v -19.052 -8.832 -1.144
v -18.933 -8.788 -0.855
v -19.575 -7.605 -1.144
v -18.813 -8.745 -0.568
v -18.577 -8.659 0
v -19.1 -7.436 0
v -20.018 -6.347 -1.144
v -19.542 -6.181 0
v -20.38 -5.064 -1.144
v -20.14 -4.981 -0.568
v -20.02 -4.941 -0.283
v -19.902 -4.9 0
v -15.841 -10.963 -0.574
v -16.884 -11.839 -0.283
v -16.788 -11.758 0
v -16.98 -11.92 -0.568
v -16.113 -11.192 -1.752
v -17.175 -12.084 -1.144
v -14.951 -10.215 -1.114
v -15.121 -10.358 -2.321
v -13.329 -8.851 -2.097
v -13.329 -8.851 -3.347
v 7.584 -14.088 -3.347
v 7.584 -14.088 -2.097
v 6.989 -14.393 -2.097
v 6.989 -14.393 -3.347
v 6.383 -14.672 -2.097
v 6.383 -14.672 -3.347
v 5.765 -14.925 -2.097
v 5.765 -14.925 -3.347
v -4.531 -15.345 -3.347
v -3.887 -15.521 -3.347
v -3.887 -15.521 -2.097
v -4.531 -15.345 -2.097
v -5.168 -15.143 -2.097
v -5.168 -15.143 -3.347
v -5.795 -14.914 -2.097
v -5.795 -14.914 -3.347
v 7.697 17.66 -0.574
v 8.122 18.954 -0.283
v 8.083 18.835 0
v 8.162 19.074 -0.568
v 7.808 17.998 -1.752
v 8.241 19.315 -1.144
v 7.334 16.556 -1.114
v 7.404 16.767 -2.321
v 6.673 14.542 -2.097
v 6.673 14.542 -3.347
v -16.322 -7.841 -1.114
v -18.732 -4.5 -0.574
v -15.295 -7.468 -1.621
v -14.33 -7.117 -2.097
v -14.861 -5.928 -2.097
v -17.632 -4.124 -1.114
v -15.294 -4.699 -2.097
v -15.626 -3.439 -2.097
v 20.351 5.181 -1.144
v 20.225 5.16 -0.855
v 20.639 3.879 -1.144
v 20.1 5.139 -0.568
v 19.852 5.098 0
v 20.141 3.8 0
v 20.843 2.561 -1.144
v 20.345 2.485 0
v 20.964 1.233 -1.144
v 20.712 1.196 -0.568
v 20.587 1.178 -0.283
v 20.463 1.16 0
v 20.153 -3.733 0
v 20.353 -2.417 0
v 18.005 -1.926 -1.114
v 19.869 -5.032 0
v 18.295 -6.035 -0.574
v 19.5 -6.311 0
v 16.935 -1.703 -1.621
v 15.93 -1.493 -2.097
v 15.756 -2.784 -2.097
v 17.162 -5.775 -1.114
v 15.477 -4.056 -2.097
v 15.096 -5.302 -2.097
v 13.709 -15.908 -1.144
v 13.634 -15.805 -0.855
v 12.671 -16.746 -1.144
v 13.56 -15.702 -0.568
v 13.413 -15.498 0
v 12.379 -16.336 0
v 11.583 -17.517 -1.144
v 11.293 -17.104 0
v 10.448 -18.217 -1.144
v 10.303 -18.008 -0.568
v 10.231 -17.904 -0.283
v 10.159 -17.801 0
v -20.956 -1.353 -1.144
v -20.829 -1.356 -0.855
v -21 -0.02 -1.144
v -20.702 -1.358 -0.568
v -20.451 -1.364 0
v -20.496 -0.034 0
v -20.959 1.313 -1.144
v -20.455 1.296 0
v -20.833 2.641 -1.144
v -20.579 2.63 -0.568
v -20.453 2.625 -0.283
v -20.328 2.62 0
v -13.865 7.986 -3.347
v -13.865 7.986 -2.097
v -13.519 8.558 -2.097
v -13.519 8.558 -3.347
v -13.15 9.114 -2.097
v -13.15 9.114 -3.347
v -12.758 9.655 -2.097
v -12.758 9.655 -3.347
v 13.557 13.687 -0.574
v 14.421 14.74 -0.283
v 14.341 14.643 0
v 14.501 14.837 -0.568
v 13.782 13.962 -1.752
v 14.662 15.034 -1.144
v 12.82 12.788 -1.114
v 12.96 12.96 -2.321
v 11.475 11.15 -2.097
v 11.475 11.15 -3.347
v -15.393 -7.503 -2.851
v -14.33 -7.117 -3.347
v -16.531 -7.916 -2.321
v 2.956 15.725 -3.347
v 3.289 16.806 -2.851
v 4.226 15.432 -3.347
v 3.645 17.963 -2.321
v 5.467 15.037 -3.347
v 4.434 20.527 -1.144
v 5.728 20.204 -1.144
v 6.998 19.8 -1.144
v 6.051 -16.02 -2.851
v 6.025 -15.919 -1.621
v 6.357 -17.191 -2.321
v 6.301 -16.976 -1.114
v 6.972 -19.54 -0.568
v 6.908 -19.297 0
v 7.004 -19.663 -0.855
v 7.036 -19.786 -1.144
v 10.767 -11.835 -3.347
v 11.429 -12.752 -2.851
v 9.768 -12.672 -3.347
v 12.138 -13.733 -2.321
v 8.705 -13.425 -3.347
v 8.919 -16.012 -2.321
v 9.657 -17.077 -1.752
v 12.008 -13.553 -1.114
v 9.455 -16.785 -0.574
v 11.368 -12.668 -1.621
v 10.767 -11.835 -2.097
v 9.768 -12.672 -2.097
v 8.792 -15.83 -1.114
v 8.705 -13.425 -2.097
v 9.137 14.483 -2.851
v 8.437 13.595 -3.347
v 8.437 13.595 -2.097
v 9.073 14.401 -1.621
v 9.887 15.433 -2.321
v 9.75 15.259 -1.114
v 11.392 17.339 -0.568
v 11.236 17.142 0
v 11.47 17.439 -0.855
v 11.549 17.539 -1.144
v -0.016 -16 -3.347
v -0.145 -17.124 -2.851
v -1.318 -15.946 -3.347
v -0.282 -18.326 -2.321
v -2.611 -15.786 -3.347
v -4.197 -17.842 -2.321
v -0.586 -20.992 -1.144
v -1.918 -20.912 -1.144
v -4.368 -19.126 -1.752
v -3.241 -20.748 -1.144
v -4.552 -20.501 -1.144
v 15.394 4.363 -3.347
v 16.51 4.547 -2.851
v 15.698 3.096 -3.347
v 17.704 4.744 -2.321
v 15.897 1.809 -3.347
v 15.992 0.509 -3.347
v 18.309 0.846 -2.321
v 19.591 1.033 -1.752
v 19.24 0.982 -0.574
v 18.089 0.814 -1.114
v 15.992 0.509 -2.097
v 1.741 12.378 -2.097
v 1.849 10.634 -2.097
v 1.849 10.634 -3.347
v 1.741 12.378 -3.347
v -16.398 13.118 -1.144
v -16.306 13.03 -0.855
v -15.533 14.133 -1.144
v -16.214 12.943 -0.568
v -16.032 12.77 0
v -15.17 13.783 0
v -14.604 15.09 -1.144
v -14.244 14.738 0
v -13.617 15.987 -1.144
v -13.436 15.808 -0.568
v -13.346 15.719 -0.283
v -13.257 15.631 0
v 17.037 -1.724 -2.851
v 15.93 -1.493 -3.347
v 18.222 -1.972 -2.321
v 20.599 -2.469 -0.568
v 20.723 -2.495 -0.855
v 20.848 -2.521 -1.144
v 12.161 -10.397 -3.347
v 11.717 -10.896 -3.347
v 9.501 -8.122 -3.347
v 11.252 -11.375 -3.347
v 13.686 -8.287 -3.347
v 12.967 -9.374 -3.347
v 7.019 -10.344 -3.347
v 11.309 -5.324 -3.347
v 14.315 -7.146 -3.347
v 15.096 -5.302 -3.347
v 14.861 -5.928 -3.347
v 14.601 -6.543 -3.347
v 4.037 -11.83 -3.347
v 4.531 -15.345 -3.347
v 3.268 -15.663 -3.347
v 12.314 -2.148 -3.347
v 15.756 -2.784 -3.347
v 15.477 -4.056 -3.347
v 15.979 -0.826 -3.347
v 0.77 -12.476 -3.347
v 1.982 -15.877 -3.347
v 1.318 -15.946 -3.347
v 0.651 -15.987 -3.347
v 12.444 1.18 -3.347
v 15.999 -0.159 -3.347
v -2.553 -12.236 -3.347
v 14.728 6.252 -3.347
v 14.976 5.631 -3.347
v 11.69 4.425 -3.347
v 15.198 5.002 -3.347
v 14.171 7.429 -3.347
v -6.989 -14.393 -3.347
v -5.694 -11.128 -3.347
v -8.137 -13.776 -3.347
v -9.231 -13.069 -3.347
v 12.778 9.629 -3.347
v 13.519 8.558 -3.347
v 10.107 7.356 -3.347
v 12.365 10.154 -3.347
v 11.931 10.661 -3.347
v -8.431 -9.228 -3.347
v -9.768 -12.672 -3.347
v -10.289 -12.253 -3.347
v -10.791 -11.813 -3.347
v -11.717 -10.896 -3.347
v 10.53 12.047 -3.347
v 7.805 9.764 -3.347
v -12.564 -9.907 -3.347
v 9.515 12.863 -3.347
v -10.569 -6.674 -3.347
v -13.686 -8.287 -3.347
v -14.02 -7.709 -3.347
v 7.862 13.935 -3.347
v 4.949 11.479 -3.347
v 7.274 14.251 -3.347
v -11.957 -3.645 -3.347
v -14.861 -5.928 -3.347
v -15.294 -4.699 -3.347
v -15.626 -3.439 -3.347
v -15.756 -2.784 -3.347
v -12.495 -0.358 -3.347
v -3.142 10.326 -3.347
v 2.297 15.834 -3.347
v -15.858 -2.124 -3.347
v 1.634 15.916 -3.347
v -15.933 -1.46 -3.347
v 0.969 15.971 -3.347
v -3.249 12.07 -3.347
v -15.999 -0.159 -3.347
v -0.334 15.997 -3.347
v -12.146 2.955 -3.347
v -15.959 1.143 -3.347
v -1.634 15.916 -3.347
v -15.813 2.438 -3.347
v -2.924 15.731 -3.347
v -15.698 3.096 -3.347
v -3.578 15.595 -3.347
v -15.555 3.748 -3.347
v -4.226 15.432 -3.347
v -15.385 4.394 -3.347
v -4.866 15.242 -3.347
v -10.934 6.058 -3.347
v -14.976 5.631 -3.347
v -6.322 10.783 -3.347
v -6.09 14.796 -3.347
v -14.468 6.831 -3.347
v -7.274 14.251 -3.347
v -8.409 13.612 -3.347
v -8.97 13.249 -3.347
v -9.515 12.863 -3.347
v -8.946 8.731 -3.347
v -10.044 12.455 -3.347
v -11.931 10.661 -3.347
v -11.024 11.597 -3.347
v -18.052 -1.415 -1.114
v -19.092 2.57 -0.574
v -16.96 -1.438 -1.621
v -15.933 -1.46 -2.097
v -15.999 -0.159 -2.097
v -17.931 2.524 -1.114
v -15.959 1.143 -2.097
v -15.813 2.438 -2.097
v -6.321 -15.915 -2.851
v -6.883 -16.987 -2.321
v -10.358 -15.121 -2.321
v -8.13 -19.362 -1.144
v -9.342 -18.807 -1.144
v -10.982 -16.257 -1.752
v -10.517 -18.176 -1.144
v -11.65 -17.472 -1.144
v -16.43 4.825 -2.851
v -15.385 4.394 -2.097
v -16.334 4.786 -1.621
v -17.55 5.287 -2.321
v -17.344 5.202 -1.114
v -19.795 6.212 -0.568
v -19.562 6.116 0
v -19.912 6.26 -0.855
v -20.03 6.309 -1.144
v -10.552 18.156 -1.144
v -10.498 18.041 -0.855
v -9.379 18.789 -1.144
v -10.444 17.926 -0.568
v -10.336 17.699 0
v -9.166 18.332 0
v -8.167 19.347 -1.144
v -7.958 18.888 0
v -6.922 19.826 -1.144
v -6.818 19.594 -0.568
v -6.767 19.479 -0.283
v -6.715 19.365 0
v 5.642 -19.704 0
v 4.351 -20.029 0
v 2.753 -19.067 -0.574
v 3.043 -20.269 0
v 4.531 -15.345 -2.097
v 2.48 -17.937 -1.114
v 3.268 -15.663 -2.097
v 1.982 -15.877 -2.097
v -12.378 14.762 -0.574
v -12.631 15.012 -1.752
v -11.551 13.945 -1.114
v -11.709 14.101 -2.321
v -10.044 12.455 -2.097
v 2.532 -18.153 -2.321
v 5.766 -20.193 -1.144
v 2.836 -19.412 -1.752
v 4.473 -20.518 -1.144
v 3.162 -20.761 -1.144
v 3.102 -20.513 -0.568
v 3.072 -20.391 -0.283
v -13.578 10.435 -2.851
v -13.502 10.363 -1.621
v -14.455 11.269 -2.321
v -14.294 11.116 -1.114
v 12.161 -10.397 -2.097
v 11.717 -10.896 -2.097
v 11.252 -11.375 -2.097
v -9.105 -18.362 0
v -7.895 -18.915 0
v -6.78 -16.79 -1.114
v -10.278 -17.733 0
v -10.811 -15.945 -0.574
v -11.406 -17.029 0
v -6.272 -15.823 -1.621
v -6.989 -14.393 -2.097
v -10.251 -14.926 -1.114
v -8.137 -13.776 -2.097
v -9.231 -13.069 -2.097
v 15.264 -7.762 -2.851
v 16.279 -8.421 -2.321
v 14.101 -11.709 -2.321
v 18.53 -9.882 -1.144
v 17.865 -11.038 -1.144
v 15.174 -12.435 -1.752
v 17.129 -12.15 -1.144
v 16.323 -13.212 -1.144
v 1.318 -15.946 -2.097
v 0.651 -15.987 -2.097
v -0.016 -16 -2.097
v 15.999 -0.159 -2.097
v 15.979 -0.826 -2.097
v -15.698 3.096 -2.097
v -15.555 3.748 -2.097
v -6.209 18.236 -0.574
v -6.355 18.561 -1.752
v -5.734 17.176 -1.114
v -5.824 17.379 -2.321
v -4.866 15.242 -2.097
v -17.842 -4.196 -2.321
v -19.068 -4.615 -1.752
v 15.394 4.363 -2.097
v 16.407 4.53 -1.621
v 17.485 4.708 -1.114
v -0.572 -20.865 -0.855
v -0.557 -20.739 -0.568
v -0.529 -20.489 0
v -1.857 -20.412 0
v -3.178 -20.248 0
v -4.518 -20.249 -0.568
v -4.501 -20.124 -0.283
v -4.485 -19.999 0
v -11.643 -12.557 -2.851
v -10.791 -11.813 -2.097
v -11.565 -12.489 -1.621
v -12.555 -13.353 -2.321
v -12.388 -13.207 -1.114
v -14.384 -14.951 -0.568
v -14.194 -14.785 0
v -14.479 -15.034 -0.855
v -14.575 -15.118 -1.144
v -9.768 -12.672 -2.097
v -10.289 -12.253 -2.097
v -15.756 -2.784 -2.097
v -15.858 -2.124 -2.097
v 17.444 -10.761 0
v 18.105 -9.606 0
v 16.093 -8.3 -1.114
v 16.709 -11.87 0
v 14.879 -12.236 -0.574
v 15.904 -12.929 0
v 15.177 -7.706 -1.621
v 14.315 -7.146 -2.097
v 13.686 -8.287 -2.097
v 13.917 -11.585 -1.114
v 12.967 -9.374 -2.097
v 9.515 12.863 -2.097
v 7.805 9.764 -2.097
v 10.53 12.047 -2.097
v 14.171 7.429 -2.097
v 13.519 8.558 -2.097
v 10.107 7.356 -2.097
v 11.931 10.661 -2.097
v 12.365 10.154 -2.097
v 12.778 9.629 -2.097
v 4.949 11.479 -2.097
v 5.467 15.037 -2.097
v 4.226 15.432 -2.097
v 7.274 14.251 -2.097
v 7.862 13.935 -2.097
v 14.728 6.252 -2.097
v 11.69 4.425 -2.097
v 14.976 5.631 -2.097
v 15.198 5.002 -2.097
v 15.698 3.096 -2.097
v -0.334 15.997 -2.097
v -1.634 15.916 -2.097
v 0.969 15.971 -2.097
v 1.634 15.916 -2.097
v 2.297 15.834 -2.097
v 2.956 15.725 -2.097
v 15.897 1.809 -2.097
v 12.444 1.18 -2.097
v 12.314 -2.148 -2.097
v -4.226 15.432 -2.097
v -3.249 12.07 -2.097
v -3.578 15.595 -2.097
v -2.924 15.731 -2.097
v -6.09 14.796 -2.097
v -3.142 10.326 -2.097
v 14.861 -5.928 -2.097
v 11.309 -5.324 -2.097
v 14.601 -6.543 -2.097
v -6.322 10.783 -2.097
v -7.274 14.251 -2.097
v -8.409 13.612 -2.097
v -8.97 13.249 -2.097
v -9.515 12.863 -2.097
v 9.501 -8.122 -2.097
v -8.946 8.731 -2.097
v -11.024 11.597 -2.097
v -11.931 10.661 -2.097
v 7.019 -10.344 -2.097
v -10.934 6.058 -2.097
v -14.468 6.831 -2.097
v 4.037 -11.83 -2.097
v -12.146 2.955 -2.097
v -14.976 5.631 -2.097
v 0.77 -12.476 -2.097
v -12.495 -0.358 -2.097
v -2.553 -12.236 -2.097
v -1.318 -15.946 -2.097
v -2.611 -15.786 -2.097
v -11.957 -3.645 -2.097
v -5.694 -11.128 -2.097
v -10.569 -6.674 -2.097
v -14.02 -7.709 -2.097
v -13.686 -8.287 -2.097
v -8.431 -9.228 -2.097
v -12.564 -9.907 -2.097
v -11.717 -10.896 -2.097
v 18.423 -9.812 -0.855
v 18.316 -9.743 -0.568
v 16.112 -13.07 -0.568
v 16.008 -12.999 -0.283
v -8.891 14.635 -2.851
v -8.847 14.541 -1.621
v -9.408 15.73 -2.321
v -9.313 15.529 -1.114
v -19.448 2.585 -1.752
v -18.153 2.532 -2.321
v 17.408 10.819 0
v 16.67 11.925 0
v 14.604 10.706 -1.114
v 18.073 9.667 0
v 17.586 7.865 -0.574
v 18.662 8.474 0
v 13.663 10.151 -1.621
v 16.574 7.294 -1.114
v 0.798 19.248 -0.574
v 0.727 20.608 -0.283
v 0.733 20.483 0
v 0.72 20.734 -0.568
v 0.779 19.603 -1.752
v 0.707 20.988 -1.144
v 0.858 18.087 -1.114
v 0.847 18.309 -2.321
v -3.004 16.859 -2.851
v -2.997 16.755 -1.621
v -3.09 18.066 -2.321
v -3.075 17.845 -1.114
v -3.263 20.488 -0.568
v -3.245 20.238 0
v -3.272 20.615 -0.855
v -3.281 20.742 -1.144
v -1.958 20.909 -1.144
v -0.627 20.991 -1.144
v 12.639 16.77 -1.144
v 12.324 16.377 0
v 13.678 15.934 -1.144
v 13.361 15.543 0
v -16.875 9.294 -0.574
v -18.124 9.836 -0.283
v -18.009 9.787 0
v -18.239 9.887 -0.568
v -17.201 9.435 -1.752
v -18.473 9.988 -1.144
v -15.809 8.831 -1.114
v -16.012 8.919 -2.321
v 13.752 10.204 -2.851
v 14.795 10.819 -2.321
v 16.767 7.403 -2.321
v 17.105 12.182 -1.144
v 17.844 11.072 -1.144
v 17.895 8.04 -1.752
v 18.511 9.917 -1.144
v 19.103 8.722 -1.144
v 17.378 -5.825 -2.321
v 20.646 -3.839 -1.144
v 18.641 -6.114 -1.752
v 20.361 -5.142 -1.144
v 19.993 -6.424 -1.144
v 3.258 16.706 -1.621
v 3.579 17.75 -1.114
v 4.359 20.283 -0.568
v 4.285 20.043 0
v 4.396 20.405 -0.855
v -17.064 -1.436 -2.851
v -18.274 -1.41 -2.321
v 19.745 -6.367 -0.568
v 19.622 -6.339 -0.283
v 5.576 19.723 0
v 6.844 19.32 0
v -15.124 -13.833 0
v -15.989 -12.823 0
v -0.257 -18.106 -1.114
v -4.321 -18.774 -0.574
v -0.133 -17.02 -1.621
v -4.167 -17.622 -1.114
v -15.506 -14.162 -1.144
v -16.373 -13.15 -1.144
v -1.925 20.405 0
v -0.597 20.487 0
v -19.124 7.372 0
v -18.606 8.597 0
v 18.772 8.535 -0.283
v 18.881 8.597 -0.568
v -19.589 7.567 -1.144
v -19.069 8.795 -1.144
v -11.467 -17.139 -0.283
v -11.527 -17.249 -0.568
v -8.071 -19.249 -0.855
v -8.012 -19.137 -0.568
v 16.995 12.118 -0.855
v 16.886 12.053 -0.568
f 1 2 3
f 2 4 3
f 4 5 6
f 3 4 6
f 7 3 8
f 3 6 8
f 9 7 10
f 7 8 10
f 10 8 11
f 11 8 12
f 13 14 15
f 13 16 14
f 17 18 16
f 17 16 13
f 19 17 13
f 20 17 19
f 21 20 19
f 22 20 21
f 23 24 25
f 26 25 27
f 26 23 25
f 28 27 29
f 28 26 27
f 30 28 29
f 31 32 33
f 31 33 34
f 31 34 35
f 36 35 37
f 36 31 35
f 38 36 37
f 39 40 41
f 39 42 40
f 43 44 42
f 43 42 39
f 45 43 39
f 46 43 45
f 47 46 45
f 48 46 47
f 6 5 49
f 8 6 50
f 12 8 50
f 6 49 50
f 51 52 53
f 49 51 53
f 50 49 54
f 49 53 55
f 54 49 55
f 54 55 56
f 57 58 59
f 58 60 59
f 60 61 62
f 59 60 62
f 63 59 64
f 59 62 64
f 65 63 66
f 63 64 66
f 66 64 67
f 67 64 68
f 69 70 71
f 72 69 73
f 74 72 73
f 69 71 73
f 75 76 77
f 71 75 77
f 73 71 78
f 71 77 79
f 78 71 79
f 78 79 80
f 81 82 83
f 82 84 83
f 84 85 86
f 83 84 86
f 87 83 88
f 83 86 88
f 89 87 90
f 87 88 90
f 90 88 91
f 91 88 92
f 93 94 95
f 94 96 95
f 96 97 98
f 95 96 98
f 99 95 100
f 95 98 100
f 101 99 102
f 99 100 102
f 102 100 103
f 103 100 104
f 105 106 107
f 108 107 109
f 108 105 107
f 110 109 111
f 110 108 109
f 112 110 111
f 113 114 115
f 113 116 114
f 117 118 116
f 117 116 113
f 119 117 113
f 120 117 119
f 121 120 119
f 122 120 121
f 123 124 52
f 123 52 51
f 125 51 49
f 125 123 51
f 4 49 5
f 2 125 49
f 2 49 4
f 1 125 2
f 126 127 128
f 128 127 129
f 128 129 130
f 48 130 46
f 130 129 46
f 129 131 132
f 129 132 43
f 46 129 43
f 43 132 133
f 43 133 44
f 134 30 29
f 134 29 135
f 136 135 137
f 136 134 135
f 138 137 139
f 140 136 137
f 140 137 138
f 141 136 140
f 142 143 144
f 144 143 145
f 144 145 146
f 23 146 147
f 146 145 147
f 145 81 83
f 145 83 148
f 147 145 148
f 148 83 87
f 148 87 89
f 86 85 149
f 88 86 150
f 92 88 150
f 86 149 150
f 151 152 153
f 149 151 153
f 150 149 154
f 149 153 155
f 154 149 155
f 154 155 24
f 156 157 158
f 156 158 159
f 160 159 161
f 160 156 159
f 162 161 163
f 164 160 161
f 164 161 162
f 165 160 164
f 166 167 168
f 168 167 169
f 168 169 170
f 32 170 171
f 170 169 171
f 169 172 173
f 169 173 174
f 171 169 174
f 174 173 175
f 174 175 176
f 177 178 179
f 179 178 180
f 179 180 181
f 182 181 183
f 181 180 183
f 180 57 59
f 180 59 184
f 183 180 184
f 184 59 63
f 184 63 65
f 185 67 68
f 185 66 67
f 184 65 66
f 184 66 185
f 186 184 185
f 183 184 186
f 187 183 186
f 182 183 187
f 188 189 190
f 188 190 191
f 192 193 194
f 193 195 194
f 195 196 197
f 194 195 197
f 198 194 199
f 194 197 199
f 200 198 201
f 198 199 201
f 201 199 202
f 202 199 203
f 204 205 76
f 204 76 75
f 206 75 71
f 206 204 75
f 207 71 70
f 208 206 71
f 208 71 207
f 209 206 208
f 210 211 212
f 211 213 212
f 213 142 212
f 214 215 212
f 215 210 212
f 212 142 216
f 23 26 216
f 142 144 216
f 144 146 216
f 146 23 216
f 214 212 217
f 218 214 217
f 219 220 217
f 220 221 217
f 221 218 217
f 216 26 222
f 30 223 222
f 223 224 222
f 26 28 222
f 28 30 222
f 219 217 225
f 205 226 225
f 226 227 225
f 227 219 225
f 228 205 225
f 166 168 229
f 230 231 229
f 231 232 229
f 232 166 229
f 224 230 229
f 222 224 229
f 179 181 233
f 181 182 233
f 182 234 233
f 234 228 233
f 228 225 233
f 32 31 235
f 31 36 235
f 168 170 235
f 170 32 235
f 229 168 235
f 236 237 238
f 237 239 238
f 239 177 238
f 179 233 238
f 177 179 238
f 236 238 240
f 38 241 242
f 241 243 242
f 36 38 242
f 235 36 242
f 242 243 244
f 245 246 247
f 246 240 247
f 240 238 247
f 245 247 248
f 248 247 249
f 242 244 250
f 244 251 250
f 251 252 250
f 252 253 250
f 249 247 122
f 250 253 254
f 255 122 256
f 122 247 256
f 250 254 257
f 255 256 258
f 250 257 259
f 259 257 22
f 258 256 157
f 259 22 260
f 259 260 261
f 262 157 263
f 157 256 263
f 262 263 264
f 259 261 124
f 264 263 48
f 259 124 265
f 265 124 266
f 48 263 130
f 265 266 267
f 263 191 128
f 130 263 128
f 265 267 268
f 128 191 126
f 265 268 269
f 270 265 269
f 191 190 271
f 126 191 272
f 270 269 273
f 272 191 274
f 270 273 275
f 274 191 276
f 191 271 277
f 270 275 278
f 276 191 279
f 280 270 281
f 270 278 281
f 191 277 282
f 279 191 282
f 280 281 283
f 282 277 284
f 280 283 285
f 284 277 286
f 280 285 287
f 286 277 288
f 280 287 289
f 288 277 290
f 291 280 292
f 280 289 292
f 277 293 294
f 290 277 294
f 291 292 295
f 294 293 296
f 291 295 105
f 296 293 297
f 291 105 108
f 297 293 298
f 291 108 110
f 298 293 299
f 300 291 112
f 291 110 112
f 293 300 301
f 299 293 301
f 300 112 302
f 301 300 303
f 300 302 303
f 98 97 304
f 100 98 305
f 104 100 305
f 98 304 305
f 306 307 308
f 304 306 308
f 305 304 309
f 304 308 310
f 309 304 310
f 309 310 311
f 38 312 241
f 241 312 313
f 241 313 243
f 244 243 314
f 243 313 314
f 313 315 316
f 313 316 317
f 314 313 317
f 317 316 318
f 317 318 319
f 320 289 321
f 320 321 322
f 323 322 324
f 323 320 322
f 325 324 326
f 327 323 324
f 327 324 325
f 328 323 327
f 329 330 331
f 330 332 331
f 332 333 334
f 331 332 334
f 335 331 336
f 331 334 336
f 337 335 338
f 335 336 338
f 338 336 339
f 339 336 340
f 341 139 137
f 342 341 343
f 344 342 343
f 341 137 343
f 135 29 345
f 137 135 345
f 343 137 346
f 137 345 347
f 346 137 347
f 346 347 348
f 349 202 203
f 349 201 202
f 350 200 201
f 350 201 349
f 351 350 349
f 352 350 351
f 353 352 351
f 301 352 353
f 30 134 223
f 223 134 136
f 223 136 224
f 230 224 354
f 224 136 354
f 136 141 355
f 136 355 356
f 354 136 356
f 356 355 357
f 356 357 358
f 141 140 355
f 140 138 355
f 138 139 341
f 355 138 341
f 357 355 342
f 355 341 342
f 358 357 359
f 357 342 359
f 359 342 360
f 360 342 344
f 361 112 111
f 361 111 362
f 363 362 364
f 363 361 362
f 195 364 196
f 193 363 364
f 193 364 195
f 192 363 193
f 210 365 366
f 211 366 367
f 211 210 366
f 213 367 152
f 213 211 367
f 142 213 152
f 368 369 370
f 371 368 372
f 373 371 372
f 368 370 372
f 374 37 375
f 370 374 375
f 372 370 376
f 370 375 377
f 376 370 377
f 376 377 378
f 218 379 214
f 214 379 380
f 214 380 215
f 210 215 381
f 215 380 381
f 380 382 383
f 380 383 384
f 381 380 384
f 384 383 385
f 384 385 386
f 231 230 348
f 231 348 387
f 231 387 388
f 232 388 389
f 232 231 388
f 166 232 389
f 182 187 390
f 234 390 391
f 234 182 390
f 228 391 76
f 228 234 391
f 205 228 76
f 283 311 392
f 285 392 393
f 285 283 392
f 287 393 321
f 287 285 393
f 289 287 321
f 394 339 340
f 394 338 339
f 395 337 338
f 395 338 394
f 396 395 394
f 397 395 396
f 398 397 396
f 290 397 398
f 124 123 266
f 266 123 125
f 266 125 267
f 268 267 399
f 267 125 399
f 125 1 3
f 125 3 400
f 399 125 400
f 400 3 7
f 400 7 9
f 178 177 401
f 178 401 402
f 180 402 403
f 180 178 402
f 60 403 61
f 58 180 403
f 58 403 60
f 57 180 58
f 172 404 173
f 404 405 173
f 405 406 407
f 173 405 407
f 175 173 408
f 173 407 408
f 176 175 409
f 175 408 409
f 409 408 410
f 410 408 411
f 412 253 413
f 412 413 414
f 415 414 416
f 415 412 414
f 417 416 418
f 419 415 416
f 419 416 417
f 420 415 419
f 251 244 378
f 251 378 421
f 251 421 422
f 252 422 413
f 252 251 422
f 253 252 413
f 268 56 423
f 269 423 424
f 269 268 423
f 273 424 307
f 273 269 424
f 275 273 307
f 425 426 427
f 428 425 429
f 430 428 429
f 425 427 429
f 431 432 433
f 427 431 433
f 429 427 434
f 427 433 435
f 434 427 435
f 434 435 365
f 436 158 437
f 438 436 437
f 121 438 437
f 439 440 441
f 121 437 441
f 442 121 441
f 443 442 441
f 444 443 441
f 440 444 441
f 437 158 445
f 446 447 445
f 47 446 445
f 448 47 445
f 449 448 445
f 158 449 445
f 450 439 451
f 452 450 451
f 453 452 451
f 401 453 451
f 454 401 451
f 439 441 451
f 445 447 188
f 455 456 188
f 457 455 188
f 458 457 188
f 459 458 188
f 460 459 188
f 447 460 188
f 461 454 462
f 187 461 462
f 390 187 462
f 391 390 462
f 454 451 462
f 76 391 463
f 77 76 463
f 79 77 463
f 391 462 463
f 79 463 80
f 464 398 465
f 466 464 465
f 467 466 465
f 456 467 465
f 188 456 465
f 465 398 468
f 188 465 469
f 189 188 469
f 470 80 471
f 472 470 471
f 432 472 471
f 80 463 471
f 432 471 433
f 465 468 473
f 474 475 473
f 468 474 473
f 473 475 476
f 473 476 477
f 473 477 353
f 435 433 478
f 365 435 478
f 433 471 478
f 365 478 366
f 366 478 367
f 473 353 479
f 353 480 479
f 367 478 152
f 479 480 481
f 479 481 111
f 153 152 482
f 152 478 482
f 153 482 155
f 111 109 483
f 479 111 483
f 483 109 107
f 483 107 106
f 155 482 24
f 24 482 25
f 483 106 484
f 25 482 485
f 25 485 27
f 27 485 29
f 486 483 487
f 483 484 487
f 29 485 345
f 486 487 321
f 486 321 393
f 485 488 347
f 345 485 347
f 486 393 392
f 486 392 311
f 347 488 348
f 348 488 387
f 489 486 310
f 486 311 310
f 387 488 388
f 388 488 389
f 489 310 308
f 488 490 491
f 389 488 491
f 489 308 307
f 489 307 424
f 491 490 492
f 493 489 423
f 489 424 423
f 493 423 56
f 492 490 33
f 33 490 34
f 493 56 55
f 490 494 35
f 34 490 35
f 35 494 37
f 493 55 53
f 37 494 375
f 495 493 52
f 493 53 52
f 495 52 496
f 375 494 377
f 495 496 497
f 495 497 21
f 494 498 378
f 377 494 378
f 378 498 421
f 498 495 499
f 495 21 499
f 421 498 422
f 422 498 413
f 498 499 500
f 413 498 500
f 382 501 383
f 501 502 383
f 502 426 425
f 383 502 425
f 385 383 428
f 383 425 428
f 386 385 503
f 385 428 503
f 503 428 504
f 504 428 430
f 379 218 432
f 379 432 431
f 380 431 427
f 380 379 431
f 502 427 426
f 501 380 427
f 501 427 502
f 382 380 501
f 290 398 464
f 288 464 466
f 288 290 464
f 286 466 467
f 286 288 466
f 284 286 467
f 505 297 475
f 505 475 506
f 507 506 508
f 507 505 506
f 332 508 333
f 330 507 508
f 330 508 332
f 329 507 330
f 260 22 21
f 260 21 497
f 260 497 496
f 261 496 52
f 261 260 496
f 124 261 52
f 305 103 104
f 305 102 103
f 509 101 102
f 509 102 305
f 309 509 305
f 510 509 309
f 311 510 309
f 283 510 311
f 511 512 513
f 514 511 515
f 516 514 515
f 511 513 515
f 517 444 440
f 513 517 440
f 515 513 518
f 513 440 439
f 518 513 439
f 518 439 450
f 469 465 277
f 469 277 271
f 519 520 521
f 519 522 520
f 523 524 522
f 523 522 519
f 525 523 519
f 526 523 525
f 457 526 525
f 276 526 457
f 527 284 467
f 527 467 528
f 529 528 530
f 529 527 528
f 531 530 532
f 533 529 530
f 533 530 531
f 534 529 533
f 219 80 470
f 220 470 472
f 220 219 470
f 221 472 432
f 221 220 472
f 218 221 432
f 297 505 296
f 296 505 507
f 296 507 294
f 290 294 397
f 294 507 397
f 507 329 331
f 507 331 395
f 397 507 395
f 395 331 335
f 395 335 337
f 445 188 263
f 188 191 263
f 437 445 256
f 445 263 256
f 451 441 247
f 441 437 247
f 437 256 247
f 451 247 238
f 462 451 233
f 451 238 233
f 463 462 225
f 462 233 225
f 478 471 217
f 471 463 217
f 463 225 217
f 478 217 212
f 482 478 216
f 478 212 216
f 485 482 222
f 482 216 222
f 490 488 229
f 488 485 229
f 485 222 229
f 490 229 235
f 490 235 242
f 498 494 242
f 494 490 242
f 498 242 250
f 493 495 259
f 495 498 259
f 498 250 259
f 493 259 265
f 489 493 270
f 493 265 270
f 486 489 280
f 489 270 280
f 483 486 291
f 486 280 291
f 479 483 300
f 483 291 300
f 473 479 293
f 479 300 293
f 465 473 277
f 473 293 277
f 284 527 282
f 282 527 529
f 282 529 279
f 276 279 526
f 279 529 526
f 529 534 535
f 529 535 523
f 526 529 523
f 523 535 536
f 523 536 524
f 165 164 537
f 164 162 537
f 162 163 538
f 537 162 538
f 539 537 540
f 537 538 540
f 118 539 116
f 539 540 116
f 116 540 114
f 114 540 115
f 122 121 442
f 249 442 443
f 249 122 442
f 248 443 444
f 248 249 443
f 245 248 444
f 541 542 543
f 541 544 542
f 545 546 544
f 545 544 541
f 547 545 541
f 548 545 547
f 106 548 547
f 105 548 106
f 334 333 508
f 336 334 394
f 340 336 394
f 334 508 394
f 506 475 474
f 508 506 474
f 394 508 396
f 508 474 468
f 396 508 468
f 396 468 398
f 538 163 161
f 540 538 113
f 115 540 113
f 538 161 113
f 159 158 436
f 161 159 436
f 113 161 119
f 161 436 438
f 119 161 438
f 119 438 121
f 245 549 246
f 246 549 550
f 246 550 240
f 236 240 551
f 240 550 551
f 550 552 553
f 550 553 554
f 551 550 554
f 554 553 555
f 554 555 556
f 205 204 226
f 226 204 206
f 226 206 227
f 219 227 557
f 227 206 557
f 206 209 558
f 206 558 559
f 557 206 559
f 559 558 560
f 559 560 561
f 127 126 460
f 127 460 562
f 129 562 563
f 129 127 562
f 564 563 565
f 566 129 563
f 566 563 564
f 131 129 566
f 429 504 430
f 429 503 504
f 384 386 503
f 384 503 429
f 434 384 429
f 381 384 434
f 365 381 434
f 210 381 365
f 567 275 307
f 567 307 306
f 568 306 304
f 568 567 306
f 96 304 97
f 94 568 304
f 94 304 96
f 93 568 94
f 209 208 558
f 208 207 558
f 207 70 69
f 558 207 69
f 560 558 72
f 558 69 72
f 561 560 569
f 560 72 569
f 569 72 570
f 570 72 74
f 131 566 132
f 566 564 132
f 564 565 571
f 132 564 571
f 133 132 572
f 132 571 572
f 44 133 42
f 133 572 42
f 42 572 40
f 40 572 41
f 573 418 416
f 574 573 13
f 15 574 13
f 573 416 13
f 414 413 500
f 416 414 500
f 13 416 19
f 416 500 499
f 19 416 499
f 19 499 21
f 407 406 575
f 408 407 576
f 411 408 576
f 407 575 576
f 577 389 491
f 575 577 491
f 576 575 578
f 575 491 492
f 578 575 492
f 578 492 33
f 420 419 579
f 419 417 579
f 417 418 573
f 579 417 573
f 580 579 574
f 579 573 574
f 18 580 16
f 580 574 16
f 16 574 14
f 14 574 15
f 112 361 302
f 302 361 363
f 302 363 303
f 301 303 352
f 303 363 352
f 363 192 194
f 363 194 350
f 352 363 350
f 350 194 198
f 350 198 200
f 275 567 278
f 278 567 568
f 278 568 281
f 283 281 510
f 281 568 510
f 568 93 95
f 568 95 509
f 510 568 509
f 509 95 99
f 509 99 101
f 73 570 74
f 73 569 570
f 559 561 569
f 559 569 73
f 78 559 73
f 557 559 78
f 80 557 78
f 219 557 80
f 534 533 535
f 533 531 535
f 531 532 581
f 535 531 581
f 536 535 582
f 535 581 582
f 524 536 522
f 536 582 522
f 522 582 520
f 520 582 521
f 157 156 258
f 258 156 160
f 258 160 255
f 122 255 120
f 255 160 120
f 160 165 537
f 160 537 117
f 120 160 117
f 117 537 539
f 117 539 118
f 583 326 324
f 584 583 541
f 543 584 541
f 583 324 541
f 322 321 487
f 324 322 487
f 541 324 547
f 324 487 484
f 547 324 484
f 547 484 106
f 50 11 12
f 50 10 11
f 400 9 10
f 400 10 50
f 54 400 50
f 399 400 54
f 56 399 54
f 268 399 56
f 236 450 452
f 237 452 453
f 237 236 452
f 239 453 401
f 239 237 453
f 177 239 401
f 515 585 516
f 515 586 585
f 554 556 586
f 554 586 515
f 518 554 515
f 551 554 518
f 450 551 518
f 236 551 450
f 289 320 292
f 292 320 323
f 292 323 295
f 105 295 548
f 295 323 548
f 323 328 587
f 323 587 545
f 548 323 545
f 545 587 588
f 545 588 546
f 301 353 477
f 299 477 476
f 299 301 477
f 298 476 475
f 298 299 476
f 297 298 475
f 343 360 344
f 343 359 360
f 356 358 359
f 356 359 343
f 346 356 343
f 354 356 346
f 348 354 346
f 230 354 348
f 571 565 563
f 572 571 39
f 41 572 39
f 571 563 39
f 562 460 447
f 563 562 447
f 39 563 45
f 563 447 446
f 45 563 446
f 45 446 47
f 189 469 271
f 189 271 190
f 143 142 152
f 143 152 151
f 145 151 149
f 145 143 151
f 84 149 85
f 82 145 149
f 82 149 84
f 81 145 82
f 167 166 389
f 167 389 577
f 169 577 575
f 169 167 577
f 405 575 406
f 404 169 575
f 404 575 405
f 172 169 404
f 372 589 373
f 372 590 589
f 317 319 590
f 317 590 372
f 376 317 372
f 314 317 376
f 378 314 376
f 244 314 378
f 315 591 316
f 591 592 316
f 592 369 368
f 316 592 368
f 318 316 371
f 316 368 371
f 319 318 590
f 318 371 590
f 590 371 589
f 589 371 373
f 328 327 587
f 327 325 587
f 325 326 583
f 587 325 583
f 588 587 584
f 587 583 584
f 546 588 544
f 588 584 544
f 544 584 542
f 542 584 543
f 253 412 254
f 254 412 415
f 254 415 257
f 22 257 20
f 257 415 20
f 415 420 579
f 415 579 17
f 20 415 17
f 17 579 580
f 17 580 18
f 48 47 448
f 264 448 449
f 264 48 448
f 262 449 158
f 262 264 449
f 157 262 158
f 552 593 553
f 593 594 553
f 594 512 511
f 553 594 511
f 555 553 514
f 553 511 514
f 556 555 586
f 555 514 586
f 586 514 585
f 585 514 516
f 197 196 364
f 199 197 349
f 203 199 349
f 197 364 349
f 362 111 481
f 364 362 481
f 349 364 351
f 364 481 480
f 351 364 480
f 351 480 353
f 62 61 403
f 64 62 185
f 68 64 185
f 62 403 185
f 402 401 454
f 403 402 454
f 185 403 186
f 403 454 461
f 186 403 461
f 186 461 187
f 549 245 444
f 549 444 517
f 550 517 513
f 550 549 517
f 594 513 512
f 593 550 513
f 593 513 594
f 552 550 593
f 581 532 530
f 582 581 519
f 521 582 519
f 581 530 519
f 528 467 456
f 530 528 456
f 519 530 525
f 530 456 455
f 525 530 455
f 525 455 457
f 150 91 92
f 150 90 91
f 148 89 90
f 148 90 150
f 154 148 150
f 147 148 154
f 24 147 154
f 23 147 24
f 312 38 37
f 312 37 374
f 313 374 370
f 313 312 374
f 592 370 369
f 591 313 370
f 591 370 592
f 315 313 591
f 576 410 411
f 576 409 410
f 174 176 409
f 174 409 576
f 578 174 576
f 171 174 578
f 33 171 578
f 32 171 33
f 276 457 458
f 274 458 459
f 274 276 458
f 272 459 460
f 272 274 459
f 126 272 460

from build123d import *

# Parameters (mm, degrees)
SKETCH2_OUTSIDE_W        = 55.898
SKETCH2_OUTSIDE_H        = 55.898
SKETCH2_OUTSIDE_R        = 12.5
CUT_EXTRUDE_DEPTH        = 4.346553008
PATTERN_CIRCULAR_4_COUNT = 17
EXTRUDE_1_DEPTH          = 1.25


with BuildPart() as part:
    # Sketch1 → Base-Extrude (revolve)
    with BuildSketch(Plane.YZ):
        Polygon((0, -3.346553008), (-16, -3.346553008), (-21, -1.143921767), (-20.496072436, 0), (-16, -2.096553008), (0, -2.096553008), align=None)
    revolve(axis=Axis((0, 0, 5.823648763), (0, 0, -1)))

    # Sketch2 outside → Cut-Extrude (cut, through all)
    with BuildSketch(Plane(origin=(-2.40435344, 1.003568156, -3.346553008), x_dir=(-1, 0, 0), z_dir=(0, 0, -1))):
        with Locations((-2.404, -1.004)):
            Rectangle(SKETCH2_OUTSIDE_W, SKETCH2_OUTSIDE_H)
        with BuildLine():
            Line((-15.182466724, 8.625545038), (-19.50954274, 11.178898713))
            ThreePointArc((-19.50954274, 11.178898713), (-20.590886919, 9.496431844), (-21.507273879, 7.718726879))
            Line((-21.507273879, 7.718726879), (-17.132466724, 5.248045963))
            ThreePointArc((-17.132466724, 5.248045963), (11.452053021, -9.003568156), (-15.182466724, 8.625545038))
        make_face(mode=Mode.SUBTRACT)
        with Locations((-2.40435344, -1.003568156)):
            Circle(SKETCH2_OUTSIDE_R)
    extrude(amount=-CUT_EXTRUDE_DEPTH, mode=Mode.SUBTRACT)


with BuildPart() as pattern_circular_4_1:
    # 阵列(圆周)4: pattern copy
    add(part.part.rotate(Axis((0, 0, 0), (0, 0, 1)), 1 * 360 / PATTERN_CIRCULAR_4_COUNT))


with BuildPart() as pattern_circular_4_2:
    # 阵列(圆周)4: pattern copy
    add(part.part.rotate(Axis((0, 0, 0), (0, 0, 1)), 2 * 360 / PATTERN_CIRCULAR_4_COUNT))


with BuildPart() as pattern_circular_4_3:
    # 阵列(圆周)4: pattern copy
    add(part.part.rotate(Axis((0, 0, 0), (0, 0, 1)), 3 * 360 / PATTERN_CIRCULAR_4_COUNT))


with BuildPart() as pattern_circular_4_4:
    # 阵列(圆周)4: pattern copy
    add(part.part.rotate(Axis((0, 0, 0), (0, 0, 1)), 4 * 360 / PATTERN_CIRCULAR_4_COUNT))


with BuildPart() as pattern_circular_4_5:
    # 阵列(圆周)4: pattern copy
    add(part.part.rotate(Axis((0, 0, 0), (0, 0, 1)), 5 * 360 / PATTERN_CIRCULAR_4_COUNT))


with BuildPart() as pattern_circular_4_6:
    # 阵列(圆周)4: pattern copy
    add(part.part.rotate(Axis((0, 0, 0), (0, 0, 1)), 6 * 360 / PATTERN_CIRCULAR_4_COUNT))


with BuildPart() as pattern_circular_4_7:
    # 阵列(圆周)4: pattern copy
    add(part.part.rotate(Axis((0, 0, 0), (0, 0, 1)), 7 * 360 / PATTERN_CIRCULAR_4_COUNT))


with BuildPart() as pattern_circular_4_8:
    # 阵列(圆周)4: pattern copy
    add(part.part.rotate(Axis((0, 0, 0), (0, 0, 1)), 8 * 360 / PATTERN_CIRCULAR_4_COUNT))


with BuildPart() as pattern_circular_4_9:
    # 阵列(圆周)4: pattern copy
    add(part.part.rotate(Axis((0, 0, 0), (0, 0, 1)), 9 * 360 / PATTERN_CIRCULAR_4_COUNT))


with BuildPart() as pattern_circular_4_10:
    # 阵列(圆周)4: pattern copy
    add(part.part.rotate(Axis((0, 0, 0), (0, 0, 1)), 10 * 360 / PATTERN_CIRCULAR_4_COUNT))


with BuildPart() as pattern_circular_4_11:
    # 阵列(圆周)4: pattern copy
    add(part.part.rotate(Axis((0, 0, 0), (0, 0, 1)), 11 * 360 / PATTERN_CIRCULAR_4_COUNT))


with BuildPart() as pattern_circular_4_12:
    # 阵列(圆周)4: pattern copy
    add(part.part.rotate(Axis((0, 0, 0), (0, 0, 1)), 12 * 360 / PATTERN_CIRCULAR_4_COUNT))


with BuildPart() as pattern_circular_4_13:
    # 阵列(圆周)4: pattern copy
    add(part.part.rotate(Axis((0, 0, 0), (0, 0, 1)), 13 * 360 / PATTERN_CIRCULAR_4_COUNT))


with BuildPart() as pattern_circular_4_14:
    # 阵列(圆周)4: pattern copy
    add(part.part.rotate(Axis((0, 0, 0), (0, 0, 1)), 14 * 360 / PATTERN_CIRCULAR_4_COUNT))


with BuildPart() as pattern_circular_4_15:
    # 阵列(圆周)4: pattern copy
    add(part.part.rotate(Axis((0, 0, 0), (0, 0, 1)), 15 * 360 / PATTERN_CIRCULAR_4_COUNT))


with BuildPart() as pattern_circular_4_16:
    # 阵列(圆周)4: pattern copy
    add(part.part.rotate(Axis((0, 0, 0), (0, 0, 1)), 16 * 360 / PATTERN_CIRCULAR_4_COUNT))


with BuildPart() as part_1:
    add(part.part)

    add(pattern_circular_4_1.part)  # 凸台-拉伸1 merges 阵列(圆周)4_1

    add(pattern_circular_4_2.part)  # 凸台-拉伸1 merges 阵列(圆周)4_2

    add(pattern_circular_4_3.part)  # 凸台-拉伸1 merges 阵列(圆周)4_3

    add(pattern_circular_4_4.part)  # 凸台-拉伸1 merges 阵列(圆周)4_4

    add(pattern_circular_4_5.part)  # 凸台-拉伸1 merges 阵列(圆周)4_5

    add(pattern_circular_4_6.part)  # 凸台-拉伸1 merges 阵列(圆周)4_6

    add(pattern_circular_4_7.part)  # 凸台-拉伸1 merges 阵列(圆周)4_7

    add(pattern_circular_4_8.part)  # 凸台-拉伸1 merges 阵列(圆周)4_8

    add(pattern_circular_4_9.part)  # 凸台-拉伸1 merges 阵列(圆周)4_9

    add(pattern_circular_4_10.part)  # 凸台-拉伸1 merges 阵列(圆周)4_10

    add(pattern_circular_4_11.part)  # 凸台-拉伸1 merges 阵列(圆周)4_11

    add(pattern_circular_4_12.part)  # 凸台-拉伸1 merges 阵列(圆周)4_12

    add(pattern_circular_4_13.part)  # 凸台-拉伸1 merges 阵列(圆周)4_13

    add(pattern_circular_4_14.part)  # 凸台-拉伸1 merges 阵列(圆周)4_14

    add(pattern_circular_4_15.part)  # 凸台-拉伸1 merges 阵列(圆周)4_15

    add(pattern_circular_4_16.part)  # 凸台-拉伸1 merges 阵列(圆周)4_16
    # 草图2 → 凸台-拉伸1 (add)
    with BuildSketch(Plane.XY.offset(-2.096553008)):
        with BuildLine():
            Line((1.848868807, 10.633987217), (1.741294281, 12.378121595))
            ThreePointArc((1.741294281, 12.378121595), (-0.769511327, 12.476291609), (-3.249222363, 12.070317065))
            Line((-3.249222363, 12.070317065), (-3.141647836, 10.326182686))
            Line((-3.141647836, 10.326182686), (1.848868807, 10.633987217))
        make_face()
    extrude(amount=-EXTRUDE_1_DEPTH)


solid = part_1.part
